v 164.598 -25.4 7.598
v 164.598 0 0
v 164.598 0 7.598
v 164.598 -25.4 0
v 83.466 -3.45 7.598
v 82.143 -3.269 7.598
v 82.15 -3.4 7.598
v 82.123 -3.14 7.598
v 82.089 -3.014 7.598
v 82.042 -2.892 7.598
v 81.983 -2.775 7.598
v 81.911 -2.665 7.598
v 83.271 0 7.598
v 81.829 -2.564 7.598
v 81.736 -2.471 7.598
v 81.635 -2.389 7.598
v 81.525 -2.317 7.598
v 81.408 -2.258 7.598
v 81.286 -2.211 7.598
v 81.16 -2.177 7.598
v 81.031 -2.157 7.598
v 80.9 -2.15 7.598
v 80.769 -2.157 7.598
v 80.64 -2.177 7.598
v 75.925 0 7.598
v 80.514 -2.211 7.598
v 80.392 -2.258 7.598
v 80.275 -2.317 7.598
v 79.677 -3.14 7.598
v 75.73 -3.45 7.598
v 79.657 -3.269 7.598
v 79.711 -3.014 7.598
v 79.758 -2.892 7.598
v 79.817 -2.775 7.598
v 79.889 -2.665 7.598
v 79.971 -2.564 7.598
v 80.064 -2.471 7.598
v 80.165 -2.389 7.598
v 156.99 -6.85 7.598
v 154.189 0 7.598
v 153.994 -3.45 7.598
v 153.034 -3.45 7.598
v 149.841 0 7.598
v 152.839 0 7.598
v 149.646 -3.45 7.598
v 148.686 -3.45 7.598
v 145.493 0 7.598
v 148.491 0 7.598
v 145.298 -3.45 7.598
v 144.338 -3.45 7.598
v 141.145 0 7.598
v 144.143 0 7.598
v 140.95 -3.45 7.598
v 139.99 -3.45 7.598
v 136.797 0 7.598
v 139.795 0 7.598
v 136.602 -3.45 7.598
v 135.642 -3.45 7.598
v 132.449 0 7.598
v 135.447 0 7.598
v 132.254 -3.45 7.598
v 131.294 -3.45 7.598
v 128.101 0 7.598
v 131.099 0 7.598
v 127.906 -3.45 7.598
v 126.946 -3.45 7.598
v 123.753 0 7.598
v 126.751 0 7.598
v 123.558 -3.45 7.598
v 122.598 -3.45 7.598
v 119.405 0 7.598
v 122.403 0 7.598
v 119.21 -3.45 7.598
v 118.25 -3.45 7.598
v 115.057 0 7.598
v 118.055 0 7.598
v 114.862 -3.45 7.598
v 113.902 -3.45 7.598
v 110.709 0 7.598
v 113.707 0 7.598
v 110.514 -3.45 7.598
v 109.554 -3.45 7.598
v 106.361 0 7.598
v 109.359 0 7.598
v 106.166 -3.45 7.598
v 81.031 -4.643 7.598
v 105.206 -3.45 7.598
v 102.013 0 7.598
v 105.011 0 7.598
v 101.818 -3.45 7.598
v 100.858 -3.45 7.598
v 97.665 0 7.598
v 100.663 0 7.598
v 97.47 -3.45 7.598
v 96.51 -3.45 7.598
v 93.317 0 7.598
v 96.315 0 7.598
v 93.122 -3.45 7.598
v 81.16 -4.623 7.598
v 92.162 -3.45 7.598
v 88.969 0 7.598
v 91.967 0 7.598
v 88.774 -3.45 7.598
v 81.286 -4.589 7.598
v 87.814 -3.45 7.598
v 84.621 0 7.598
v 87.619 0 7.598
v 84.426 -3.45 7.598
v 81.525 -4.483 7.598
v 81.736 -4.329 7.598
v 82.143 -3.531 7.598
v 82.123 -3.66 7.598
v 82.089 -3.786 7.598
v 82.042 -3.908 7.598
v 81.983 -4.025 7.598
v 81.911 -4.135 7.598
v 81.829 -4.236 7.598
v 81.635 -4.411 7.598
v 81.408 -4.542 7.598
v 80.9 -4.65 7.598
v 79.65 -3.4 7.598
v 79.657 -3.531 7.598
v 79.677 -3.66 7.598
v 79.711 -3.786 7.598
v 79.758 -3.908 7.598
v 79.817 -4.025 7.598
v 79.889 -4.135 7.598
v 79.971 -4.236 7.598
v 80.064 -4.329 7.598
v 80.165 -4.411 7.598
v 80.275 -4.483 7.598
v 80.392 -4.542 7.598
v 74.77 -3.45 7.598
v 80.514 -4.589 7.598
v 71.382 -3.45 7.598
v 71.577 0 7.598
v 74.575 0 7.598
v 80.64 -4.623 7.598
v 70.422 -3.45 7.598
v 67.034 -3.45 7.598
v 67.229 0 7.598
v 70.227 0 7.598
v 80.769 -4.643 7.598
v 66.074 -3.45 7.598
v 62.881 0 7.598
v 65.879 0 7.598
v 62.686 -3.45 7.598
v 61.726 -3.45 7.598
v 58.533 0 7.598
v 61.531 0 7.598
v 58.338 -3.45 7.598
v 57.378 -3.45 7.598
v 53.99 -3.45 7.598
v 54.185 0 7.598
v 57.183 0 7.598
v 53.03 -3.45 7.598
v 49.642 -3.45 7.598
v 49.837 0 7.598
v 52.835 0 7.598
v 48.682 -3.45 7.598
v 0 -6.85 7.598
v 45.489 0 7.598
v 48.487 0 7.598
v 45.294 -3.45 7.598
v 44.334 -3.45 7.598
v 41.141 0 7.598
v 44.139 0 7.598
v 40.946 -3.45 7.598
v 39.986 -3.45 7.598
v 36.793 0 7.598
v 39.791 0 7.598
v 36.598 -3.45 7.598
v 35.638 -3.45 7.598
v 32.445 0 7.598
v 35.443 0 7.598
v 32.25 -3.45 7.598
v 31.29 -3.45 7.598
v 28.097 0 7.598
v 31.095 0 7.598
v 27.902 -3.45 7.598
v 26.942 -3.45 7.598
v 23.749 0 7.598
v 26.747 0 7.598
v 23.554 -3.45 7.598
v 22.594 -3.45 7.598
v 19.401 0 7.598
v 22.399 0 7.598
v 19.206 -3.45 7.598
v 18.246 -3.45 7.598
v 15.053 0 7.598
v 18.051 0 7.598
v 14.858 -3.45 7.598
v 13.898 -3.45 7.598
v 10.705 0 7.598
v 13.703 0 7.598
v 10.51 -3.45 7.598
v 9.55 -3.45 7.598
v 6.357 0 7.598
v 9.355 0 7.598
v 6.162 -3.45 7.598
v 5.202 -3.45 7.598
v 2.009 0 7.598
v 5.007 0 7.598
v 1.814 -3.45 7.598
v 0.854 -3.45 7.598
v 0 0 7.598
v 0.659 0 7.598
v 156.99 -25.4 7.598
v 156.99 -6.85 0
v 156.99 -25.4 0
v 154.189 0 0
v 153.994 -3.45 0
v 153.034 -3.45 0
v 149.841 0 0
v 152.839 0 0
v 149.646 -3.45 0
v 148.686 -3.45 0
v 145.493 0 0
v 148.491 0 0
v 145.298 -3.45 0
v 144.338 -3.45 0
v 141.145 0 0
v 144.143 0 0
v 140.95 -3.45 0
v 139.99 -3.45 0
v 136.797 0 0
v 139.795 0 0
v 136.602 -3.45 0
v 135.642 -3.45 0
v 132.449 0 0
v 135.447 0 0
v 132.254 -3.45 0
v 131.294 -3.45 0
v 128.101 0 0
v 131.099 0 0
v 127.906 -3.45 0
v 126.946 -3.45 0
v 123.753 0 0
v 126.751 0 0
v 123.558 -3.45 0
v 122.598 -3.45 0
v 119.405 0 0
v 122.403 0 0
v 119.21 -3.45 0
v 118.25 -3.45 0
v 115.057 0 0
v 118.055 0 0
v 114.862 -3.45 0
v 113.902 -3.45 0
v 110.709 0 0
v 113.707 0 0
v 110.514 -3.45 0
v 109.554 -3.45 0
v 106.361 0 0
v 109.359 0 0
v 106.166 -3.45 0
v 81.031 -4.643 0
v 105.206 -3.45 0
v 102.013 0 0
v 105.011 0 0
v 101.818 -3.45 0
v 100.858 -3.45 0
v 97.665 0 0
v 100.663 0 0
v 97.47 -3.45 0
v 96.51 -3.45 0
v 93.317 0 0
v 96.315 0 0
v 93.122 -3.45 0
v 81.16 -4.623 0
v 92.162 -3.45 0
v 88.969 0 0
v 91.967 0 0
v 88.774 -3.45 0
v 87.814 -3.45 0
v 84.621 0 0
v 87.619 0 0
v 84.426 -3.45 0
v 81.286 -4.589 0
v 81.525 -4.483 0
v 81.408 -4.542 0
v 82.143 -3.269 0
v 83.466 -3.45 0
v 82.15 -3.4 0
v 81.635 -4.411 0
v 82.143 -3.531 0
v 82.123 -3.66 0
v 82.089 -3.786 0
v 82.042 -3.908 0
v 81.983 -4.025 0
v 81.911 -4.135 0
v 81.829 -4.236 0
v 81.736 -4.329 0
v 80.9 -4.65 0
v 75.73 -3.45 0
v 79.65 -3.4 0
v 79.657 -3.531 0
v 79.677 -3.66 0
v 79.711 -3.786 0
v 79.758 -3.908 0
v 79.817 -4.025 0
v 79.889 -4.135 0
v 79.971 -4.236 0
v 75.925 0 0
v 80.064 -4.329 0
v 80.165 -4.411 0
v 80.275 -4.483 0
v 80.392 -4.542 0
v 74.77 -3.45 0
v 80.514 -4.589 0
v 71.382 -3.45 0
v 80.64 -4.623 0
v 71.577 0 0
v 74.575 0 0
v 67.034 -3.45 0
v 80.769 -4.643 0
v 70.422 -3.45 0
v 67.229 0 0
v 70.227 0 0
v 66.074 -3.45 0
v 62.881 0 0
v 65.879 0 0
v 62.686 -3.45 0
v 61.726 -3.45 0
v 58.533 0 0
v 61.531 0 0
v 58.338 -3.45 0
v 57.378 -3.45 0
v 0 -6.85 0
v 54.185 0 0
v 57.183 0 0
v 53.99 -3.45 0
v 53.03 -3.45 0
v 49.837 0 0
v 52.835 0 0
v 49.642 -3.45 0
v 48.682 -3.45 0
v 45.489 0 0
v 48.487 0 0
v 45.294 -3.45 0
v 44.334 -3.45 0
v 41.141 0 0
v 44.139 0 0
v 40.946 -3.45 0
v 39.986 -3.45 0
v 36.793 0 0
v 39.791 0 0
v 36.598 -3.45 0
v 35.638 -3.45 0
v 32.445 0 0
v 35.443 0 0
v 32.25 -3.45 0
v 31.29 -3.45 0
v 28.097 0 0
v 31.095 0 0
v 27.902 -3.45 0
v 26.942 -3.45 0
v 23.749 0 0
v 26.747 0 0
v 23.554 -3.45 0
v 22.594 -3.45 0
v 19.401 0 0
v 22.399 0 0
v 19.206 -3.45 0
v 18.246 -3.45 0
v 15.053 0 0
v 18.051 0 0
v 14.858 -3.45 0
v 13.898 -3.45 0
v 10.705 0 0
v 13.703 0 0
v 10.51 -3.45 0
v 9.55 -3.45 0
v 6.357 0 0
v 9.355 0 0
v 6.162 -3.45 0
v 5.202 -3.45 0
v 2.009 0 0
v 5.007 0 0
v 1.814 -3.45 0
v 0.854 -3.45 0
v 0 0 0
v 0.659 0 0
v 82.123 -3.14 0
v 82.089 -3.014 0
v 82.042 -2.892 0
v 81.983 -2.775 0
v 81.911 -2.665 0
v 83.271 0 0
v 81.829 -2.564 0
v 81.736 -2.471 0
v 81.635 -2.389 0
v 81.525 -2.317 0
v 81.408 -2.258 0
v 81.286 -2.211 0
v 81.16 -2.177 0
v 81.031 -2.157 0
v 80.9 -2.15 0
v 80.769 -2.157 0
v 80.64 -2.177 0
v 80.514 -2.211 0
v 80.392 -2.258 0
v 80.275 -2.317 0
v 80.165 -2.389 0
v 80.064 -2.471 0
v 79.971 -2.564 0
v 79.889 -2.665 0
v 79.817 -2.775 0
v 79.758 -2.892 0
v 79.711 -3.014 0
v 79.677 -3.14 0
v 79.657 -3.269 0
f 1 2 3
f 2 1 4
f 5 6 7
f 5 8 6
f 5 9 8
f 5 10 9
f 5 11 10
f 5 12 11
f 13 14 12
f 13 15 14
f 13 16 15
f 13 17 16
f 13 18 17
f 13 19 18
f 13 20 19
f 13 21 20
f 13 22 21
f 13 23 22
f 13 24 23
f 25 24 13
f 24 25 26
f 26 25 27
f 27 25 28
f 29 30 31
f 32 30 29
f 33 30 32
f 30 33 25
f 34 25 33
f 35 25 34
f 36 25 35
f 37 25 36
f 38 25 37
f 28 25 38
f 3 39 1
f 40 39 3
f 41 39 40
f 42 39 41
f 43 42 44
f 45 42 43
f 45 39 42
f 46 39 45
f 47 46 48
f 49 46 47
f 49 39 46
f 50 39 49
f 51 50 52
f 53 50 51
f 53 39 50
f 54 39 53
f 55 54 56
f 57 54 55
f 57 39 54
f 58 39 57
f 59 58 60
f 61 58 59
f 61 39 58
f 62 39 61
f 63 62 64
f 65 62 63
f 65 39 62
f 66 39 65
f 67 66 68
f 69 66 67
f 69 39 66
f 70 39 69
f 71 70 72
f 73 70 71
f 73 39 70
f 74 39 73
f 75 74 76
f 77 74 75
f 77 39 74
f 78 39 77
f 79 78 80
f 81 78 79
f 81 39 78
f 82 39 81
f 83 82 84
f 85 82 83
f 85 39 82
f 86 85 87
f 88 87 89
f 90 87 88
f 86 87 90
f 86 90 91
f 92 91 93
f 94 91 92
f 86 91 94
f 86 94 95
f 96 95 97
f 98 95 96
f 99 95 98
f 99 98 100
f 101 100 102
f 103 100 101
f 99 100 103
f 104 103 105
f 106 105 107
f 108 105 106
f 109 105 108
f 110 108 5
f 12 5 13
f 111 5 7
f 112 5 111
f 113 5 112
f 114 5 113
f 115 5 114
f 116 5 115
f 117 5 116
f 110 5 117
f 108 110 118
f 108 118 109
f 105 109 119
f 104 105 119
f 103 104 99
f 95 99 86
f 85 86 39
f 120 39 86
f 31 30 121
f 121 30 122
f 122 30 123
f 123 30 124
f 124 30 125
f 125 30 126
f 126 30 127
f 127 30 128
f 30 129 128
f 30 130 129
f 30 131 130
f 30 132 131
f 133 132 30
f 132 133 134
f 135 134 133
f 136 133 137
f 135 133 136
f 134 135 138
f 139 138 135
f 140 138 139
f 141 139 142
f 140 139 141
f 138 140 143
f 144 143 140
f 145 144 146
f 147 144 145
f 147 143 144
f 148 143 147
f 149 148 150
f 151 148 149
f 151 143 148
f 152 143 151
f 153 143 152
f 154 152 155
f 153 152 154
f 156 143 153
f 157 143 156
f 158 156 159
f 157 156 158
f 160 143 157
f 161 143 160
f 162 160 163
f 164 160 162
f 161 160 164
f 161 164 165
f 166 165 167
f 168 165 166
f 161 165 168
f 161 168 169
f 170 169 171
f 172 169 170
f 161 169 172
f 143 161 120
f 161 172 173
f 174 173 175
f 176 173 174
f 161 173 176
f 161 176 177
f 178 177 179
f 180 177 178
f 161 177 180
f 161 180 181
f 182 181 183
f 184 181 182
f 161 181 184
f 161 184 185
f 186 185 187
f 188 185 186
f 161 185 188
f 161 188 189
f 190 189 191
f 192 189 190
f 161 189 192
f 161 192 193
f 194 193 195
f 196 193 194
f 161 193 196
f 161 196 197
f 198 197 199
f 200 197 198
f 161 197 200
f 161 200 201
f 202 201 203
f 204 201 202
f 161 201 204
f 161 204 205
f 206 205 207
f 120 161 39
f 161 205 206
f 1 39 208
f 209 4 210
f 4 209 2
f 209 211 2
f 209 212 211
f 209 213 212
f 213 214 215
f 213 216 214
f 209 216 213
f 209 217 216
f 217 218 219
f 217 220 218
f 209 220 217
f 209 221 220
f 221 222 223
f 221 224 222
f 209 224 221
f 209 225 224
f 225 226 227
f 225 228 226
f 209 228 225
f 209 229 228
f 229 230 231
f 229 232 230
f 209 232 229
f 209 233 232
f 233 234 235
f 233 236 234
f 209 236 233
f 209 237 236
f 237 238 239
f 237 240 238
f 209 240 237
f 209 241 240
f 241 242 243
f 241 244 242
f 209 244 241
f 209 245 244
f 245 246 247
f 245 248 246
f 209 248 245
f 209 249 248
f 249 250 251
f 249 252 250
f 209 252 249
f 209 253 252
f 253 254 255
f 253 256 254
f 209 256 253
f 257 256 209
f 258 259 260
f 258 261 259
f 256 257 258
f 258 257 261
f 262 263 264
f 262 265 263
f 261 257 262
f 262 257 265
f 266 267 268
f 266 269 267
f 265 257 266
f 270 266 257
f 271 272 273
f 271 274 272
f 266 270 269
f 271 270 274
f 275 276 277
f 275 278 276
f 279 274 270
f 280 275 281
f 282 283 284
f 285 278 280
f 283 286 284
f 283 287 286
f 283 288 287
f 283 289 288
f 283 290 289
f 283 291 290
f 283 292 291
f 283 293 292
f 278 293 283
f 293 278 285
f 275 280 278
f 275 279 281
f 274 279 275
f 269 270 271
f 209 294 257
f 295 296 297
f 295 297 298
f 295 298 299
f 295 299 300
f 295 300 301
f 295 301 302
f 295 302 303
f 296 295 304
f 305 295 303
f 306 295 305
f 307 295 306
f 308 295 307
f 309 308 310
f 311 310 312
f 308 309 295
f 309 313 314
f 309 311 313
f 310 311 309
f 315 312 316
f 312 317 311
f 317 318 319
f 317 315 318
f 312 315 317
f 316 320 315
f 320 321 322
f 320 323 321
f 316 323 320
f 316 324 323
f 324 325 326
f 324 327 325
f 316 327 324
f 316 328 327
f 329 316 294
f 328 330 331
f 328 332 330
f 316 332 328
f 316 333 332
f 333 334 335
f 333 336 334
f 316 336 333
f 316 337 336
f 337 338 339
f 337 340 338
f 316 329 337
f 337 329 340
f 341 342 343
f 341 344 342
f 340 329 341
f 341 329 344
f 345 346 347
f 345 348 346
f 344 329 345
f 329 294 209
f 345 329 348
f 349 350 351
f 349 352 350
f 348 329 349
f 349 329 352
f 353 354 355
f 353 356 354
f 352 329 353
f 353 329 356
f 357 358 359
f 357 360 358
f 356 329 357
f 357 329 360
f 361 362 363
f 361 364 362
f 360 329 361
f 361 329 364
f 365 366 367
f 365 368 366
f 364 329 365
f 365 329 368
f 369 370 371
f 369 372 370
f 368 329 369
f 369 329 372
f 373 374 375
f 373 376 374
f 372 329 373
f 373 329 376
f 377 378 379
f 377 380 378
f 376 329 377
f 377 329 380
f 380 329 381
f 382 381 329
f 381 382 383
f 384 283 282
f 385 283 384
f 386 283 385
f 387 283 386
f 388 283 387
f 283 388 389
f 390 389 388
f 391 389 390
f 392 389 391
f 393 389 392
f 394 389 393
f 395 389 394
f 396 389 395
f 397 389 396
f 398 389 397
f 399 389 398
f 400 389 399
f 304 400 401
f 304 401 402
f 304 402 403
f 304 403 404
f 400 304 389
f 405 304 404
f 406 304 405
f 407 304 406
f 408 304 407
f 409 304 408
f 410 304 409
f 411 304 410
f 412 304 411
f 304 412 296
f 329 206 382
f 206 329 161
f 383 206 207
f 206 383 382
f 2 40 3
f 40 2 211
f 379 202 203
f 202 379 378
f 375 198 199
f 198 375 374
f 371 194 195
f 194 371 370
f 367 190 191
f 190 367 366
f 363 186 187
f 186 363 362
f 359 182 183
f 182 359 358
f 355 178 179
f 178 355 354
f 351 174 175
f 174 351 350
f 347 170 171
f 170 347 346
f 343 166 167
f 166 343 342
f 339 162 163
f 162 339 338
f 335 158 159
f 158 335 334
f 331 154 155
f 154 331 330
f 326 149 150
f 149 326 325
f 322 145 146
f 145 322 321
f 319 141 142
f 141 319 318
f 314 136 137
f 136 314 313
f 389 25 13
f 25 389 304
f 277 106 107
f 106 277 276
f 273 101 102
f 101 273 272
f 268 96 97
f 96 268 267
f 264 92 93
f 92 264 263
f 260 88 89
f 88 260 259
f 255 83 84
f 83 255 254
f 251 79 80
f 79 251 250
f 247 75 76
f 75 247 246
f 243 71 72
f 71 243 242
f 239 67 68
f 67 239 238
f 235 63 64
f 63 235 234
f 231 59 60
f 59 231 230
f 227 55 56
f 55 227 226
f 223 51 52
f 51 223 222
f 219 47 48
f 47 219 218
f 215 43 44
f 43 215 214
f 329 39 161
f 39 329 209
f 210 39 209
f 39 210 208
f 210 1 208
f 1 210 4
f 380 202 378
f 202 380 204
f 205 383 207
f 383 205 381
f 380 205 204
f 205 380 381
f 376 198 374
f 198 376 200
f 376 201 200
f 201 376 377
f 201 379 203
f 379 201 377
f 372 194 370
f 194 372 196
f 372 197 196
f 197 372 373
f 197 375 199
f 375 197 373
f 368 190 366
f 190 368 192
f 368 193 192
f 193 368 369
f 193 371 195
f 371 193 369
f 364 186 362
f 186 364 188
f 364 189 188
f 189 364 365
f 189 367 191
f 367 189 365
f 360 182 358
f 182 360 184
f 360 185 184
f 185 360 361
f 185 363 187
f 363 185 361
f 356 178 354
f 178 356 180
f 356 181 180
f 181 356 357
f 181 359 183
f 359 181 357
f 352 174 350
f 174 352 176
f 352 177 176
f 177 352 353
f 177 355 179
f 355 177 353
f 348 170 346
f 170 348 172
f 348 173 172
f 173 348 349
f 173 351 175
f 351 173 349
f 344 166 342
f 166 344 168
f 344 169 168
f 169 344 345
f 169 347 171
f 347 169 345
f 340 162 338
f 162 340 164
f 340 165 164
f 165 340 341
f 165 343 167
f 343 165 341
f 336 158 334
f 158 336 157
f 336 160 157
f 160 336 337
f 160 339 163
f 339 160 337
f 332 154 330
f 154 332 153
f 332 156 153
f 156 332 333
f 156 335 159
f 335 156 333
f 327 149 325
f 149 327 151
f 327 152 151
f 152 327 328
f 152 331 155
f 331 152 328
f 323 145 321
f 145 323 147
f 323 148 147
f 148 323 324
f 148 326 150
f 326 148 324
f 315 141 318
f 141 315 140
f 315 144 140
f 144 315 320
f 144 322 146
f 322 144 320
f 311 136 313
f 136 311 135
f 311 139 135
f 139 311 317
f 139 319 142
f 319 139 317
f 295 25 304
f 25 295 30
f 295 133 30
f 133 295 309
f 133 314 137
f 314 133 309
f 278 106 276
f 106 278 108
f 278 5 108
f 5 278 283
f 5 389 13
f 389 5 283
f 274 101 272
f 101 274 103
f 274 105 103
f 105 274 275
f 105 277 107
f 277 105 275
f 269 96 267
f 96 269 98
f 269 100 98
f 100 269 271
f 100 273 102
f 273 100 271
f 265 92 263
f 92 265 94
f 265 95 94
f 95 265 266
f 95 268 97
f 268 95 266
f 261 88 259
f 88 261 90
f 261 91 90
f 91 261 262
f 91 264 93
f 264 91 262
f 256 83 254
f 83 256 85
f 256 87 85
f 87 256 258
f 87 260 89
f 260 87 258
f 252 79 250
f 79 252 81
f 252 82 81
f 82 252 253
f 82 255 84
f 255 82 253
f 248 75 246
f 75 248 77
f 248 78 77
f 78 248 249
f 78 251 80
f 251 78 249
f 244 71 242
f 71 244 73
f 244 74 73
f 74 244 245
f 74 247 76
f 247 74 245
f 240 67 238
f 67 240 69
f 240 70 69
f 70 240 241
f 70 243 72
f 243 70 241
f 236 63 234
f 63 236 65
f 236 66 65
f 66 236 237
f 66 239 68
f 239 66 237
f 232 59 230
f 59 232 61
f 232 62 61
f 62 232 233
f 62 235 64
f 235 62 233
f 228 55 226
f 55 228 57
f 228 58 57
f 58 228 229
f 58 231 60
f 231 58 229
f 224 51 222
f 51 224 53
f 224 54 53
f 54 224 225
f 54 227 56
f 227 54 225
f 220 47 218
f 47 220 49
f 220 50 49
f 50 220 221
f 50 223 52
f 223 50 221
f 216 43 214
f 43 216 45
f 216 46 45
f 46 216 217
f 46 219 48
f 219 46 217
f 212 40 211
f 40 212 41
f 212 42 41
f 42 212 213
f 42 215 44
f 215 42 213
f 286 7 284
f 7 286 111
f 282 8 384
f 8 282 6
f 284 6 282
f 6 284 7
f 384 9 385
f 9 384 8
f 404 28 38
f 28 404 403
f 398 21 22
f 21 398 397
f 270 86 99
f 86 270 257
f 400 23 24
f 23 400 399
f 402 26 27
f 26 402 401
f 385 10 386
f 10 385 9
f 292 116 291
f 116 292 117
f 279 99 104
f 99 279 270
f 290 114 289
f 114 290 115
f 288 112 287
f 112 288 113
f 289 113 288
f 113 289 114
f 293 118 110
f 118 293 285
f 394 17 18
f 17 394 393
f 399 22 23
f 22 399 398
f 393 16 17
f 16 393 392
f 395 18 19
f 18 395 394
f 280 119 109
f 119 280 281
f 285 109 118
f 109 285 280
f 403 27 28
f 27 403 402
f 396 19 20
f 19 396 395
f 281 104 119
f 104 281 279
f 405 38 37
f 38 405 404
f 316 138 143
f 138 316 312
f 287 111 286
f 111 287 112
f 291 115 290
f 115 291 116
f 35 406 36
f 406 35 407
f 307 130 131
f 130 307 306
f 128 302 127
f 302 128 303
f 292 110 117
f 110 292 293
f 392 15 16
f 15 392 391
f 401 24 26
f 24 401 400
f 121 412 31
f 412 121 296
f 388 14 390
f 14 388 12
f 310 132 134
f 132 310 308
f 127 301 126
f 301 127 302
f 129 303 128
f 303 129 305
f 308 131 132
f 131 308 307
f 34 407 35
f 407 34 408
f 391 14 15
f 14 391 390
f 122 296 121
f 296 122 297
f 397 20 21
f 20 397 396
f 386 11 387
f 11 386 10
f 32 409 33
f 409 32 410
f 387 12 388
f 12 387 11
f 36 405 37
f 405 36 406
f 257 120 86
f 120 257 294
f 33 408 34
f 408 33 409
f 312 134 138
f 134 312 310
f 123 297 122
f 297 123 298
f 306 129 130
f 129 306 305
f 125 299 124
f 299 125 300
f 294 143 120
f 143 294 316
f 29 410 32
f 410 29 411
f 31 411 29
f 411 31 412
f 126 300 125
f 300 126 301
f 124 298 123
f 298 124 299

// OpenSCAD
// ============================================================
// finger.scad
// Rack/finger extracted from finger_and_ger_google_V3_fixed.stl
// (the long L-shaped part, i.e. everything that is NOT the gear)
//
// Measured from the original STL (component 1 of the mesh):
//   - Overall length (long arm)      : 164.598 mm
//   - Toothed bar height             : 6.85 mm
//   - Bar extrusion thickness        : 7.598 mm  (same as the gear)
//   - Rack tooth (notch) pitch       : 2.6805 mm  -- VERY uniform
//     and consistent along the entire measured length (confirmed
//     by direct measurement of ~58 notches; this is not the source
//     of the skipping problem)
//   - Notch depth                    : 2.55 mm
//   - Notch opening width (at top)   : ~0.83 mm
//   - Notch bottom width             : ~0.59 mm
//   - Pivot/pin hole (through hole)  : dia. ~2.5 mm, located at
//                                       x=80.9, y=-3.4 from the
//                                       part's top-left corner
//   - Foot (short leg of the "L")    : 7.61 mm wide, originally
//                                       44.45 mm long (measured
//                                       from the top edge)
//
// Changes made (round 2, after test print):
//   1) Foot (short end) shortened by another 1/4" (6.35 mm), on
//      top of the 1/2" already removed:
//        44.45 -> 31.75 (round 1) -> 25.4 mm (this round)
//   2) The root-radius fix in gear.scad alone did not stop the
//      gear from catching the top of the next tooth, so the rack
//      pitch (tooth separation) is widened here instead, using the
//      gear's TIP circle rather than the root circle:
//          new_pitch = 2*pi*tip_r/teeth = 2*pi*8.99/13 = 4.348 mm
//      (up from the originally-measured 2.6805 mm -- a ~62% wider
//      spacing). The notch opening/bottom widths are scaled up by
//      the same ratio to keep the same proportions, and the notch
//      is cut deeper (3.45 mm, matching the gear's addendum height
//      of tip_r - root_r) so the now-taller, 1mm-longer gear teeth
//      can fully seat instead of skating across the top land and
//      catching the next tooth.
//   This is an empirical correction based on your test print --
//   print this version and check whether it still skips; the pitch
//   or notch depth may need another small nudge either way.
// ============================================================

/* [CONFIG] */

// --- Overall bar ---
total_length   = 164.598;  // full length of the part, end to end
bar_length     = 156.99;   // length of the toothed section (before the foot)
bar_height     = 6.85;     // height of the toothed bar (top edge = y0, bottom = -bar_height)
thickness      = 7.598;    // extrusion depth (Z), matches the gear thickness

// --- Rack teeth (notches cut into the top edge) ---
// Widened from the originally-measured 2.6805 mm to match the
// gear's tip-circle circumference (2*pi*8.99/13), since the root-
// circle-based pitch wasn't enough to stop the skipping in testing.
tooth_pitch        = 4.348;   // was 2.6805
tooth_depth        = 3.45;    // was 2.55 -- matches gear addendum height (tip_r - root_r)
tooth_top_width    = 1.35;    // was 0.83 -- scaled up with the wider pitch
tooth_bottom_width = 0.96;    // was 0.59 -- scaled up with the wider pitch
first_tooth_center = 1.334;   // x position of the first notch's center

// --- Pivot / pin hole ---
add_pivot_hole = true;
pivot_hole_x   = 80.9;    // measured from the left end of the part
pivot_hole_y   = -3.4;    // measured down from the top edge
pivot_hole_d   = 2.5;     // through-hole diameter

// --- Foot (short leg of the L-shape) ---
// Original measured length (from the top edge, y=0, down to the tip)
foot_length_original = 44.45;
// Shortened by 1/2" (round 1) then another 1/4" (round 2) per request
foot_length = foot_length_original - 12.7 - 6.35;   // = 25.4 mm

// Rendering smoothness
$fn = 60;

/* [END CONFIG] */

module tooth_notch() {
    translate([0, 0, -1])
        linear_extrude(height = thickness + 2)
            polygon(points = [
                [-tooth_top_width/2,    0],
                [-tooth_bottom_width/2, -tooth_depth],
                [ tooth_bottom_width/2, -tooth_depth],
                [ tooth_top_width/2,    0]
            ]);
}

module rack_teeth() {
    n = floor((bar_length - first_tooth_center) / tooth_pitch) + 1;
    for (i = [0 : n - 1]) {
        cx = first_tooth_center + i * tooth_pitch;
        // Skip whichever tooth would land on top of the pivot hole
        skip = add_pivot_hole && abs(cx - pivot_hole_x) < (pivot_hole_d/2 + 1.2);
        if (cx < bar_length && !skip)
            translate([cx, 0, 0])
                tooth_notch();
    }
}

module body() {
    union() {
        // main toothed bar, full length (top edge flush with the foot)
        translate([0, -bar_height, 0])
            cube([total_length, bar_height, thickness]);
        // foot: extra material hanging below the bar at the right end
        translate([bar_length, -foot_length, 0])
            cube([total_length - bar_length, foot_length - bar_height, thickness]);
    }
}

module pivot_hole() {
    translate([pivot_hole_x, pivot_hole_y, -1])
        cylinder(d = pivot_hole_d, h = thickness + 2);
}

module finger() {
    difference() {
        body();
        rack_teeth();
        if (add_pivot_hole)
            pivot_hole();
    }
}

finger();
